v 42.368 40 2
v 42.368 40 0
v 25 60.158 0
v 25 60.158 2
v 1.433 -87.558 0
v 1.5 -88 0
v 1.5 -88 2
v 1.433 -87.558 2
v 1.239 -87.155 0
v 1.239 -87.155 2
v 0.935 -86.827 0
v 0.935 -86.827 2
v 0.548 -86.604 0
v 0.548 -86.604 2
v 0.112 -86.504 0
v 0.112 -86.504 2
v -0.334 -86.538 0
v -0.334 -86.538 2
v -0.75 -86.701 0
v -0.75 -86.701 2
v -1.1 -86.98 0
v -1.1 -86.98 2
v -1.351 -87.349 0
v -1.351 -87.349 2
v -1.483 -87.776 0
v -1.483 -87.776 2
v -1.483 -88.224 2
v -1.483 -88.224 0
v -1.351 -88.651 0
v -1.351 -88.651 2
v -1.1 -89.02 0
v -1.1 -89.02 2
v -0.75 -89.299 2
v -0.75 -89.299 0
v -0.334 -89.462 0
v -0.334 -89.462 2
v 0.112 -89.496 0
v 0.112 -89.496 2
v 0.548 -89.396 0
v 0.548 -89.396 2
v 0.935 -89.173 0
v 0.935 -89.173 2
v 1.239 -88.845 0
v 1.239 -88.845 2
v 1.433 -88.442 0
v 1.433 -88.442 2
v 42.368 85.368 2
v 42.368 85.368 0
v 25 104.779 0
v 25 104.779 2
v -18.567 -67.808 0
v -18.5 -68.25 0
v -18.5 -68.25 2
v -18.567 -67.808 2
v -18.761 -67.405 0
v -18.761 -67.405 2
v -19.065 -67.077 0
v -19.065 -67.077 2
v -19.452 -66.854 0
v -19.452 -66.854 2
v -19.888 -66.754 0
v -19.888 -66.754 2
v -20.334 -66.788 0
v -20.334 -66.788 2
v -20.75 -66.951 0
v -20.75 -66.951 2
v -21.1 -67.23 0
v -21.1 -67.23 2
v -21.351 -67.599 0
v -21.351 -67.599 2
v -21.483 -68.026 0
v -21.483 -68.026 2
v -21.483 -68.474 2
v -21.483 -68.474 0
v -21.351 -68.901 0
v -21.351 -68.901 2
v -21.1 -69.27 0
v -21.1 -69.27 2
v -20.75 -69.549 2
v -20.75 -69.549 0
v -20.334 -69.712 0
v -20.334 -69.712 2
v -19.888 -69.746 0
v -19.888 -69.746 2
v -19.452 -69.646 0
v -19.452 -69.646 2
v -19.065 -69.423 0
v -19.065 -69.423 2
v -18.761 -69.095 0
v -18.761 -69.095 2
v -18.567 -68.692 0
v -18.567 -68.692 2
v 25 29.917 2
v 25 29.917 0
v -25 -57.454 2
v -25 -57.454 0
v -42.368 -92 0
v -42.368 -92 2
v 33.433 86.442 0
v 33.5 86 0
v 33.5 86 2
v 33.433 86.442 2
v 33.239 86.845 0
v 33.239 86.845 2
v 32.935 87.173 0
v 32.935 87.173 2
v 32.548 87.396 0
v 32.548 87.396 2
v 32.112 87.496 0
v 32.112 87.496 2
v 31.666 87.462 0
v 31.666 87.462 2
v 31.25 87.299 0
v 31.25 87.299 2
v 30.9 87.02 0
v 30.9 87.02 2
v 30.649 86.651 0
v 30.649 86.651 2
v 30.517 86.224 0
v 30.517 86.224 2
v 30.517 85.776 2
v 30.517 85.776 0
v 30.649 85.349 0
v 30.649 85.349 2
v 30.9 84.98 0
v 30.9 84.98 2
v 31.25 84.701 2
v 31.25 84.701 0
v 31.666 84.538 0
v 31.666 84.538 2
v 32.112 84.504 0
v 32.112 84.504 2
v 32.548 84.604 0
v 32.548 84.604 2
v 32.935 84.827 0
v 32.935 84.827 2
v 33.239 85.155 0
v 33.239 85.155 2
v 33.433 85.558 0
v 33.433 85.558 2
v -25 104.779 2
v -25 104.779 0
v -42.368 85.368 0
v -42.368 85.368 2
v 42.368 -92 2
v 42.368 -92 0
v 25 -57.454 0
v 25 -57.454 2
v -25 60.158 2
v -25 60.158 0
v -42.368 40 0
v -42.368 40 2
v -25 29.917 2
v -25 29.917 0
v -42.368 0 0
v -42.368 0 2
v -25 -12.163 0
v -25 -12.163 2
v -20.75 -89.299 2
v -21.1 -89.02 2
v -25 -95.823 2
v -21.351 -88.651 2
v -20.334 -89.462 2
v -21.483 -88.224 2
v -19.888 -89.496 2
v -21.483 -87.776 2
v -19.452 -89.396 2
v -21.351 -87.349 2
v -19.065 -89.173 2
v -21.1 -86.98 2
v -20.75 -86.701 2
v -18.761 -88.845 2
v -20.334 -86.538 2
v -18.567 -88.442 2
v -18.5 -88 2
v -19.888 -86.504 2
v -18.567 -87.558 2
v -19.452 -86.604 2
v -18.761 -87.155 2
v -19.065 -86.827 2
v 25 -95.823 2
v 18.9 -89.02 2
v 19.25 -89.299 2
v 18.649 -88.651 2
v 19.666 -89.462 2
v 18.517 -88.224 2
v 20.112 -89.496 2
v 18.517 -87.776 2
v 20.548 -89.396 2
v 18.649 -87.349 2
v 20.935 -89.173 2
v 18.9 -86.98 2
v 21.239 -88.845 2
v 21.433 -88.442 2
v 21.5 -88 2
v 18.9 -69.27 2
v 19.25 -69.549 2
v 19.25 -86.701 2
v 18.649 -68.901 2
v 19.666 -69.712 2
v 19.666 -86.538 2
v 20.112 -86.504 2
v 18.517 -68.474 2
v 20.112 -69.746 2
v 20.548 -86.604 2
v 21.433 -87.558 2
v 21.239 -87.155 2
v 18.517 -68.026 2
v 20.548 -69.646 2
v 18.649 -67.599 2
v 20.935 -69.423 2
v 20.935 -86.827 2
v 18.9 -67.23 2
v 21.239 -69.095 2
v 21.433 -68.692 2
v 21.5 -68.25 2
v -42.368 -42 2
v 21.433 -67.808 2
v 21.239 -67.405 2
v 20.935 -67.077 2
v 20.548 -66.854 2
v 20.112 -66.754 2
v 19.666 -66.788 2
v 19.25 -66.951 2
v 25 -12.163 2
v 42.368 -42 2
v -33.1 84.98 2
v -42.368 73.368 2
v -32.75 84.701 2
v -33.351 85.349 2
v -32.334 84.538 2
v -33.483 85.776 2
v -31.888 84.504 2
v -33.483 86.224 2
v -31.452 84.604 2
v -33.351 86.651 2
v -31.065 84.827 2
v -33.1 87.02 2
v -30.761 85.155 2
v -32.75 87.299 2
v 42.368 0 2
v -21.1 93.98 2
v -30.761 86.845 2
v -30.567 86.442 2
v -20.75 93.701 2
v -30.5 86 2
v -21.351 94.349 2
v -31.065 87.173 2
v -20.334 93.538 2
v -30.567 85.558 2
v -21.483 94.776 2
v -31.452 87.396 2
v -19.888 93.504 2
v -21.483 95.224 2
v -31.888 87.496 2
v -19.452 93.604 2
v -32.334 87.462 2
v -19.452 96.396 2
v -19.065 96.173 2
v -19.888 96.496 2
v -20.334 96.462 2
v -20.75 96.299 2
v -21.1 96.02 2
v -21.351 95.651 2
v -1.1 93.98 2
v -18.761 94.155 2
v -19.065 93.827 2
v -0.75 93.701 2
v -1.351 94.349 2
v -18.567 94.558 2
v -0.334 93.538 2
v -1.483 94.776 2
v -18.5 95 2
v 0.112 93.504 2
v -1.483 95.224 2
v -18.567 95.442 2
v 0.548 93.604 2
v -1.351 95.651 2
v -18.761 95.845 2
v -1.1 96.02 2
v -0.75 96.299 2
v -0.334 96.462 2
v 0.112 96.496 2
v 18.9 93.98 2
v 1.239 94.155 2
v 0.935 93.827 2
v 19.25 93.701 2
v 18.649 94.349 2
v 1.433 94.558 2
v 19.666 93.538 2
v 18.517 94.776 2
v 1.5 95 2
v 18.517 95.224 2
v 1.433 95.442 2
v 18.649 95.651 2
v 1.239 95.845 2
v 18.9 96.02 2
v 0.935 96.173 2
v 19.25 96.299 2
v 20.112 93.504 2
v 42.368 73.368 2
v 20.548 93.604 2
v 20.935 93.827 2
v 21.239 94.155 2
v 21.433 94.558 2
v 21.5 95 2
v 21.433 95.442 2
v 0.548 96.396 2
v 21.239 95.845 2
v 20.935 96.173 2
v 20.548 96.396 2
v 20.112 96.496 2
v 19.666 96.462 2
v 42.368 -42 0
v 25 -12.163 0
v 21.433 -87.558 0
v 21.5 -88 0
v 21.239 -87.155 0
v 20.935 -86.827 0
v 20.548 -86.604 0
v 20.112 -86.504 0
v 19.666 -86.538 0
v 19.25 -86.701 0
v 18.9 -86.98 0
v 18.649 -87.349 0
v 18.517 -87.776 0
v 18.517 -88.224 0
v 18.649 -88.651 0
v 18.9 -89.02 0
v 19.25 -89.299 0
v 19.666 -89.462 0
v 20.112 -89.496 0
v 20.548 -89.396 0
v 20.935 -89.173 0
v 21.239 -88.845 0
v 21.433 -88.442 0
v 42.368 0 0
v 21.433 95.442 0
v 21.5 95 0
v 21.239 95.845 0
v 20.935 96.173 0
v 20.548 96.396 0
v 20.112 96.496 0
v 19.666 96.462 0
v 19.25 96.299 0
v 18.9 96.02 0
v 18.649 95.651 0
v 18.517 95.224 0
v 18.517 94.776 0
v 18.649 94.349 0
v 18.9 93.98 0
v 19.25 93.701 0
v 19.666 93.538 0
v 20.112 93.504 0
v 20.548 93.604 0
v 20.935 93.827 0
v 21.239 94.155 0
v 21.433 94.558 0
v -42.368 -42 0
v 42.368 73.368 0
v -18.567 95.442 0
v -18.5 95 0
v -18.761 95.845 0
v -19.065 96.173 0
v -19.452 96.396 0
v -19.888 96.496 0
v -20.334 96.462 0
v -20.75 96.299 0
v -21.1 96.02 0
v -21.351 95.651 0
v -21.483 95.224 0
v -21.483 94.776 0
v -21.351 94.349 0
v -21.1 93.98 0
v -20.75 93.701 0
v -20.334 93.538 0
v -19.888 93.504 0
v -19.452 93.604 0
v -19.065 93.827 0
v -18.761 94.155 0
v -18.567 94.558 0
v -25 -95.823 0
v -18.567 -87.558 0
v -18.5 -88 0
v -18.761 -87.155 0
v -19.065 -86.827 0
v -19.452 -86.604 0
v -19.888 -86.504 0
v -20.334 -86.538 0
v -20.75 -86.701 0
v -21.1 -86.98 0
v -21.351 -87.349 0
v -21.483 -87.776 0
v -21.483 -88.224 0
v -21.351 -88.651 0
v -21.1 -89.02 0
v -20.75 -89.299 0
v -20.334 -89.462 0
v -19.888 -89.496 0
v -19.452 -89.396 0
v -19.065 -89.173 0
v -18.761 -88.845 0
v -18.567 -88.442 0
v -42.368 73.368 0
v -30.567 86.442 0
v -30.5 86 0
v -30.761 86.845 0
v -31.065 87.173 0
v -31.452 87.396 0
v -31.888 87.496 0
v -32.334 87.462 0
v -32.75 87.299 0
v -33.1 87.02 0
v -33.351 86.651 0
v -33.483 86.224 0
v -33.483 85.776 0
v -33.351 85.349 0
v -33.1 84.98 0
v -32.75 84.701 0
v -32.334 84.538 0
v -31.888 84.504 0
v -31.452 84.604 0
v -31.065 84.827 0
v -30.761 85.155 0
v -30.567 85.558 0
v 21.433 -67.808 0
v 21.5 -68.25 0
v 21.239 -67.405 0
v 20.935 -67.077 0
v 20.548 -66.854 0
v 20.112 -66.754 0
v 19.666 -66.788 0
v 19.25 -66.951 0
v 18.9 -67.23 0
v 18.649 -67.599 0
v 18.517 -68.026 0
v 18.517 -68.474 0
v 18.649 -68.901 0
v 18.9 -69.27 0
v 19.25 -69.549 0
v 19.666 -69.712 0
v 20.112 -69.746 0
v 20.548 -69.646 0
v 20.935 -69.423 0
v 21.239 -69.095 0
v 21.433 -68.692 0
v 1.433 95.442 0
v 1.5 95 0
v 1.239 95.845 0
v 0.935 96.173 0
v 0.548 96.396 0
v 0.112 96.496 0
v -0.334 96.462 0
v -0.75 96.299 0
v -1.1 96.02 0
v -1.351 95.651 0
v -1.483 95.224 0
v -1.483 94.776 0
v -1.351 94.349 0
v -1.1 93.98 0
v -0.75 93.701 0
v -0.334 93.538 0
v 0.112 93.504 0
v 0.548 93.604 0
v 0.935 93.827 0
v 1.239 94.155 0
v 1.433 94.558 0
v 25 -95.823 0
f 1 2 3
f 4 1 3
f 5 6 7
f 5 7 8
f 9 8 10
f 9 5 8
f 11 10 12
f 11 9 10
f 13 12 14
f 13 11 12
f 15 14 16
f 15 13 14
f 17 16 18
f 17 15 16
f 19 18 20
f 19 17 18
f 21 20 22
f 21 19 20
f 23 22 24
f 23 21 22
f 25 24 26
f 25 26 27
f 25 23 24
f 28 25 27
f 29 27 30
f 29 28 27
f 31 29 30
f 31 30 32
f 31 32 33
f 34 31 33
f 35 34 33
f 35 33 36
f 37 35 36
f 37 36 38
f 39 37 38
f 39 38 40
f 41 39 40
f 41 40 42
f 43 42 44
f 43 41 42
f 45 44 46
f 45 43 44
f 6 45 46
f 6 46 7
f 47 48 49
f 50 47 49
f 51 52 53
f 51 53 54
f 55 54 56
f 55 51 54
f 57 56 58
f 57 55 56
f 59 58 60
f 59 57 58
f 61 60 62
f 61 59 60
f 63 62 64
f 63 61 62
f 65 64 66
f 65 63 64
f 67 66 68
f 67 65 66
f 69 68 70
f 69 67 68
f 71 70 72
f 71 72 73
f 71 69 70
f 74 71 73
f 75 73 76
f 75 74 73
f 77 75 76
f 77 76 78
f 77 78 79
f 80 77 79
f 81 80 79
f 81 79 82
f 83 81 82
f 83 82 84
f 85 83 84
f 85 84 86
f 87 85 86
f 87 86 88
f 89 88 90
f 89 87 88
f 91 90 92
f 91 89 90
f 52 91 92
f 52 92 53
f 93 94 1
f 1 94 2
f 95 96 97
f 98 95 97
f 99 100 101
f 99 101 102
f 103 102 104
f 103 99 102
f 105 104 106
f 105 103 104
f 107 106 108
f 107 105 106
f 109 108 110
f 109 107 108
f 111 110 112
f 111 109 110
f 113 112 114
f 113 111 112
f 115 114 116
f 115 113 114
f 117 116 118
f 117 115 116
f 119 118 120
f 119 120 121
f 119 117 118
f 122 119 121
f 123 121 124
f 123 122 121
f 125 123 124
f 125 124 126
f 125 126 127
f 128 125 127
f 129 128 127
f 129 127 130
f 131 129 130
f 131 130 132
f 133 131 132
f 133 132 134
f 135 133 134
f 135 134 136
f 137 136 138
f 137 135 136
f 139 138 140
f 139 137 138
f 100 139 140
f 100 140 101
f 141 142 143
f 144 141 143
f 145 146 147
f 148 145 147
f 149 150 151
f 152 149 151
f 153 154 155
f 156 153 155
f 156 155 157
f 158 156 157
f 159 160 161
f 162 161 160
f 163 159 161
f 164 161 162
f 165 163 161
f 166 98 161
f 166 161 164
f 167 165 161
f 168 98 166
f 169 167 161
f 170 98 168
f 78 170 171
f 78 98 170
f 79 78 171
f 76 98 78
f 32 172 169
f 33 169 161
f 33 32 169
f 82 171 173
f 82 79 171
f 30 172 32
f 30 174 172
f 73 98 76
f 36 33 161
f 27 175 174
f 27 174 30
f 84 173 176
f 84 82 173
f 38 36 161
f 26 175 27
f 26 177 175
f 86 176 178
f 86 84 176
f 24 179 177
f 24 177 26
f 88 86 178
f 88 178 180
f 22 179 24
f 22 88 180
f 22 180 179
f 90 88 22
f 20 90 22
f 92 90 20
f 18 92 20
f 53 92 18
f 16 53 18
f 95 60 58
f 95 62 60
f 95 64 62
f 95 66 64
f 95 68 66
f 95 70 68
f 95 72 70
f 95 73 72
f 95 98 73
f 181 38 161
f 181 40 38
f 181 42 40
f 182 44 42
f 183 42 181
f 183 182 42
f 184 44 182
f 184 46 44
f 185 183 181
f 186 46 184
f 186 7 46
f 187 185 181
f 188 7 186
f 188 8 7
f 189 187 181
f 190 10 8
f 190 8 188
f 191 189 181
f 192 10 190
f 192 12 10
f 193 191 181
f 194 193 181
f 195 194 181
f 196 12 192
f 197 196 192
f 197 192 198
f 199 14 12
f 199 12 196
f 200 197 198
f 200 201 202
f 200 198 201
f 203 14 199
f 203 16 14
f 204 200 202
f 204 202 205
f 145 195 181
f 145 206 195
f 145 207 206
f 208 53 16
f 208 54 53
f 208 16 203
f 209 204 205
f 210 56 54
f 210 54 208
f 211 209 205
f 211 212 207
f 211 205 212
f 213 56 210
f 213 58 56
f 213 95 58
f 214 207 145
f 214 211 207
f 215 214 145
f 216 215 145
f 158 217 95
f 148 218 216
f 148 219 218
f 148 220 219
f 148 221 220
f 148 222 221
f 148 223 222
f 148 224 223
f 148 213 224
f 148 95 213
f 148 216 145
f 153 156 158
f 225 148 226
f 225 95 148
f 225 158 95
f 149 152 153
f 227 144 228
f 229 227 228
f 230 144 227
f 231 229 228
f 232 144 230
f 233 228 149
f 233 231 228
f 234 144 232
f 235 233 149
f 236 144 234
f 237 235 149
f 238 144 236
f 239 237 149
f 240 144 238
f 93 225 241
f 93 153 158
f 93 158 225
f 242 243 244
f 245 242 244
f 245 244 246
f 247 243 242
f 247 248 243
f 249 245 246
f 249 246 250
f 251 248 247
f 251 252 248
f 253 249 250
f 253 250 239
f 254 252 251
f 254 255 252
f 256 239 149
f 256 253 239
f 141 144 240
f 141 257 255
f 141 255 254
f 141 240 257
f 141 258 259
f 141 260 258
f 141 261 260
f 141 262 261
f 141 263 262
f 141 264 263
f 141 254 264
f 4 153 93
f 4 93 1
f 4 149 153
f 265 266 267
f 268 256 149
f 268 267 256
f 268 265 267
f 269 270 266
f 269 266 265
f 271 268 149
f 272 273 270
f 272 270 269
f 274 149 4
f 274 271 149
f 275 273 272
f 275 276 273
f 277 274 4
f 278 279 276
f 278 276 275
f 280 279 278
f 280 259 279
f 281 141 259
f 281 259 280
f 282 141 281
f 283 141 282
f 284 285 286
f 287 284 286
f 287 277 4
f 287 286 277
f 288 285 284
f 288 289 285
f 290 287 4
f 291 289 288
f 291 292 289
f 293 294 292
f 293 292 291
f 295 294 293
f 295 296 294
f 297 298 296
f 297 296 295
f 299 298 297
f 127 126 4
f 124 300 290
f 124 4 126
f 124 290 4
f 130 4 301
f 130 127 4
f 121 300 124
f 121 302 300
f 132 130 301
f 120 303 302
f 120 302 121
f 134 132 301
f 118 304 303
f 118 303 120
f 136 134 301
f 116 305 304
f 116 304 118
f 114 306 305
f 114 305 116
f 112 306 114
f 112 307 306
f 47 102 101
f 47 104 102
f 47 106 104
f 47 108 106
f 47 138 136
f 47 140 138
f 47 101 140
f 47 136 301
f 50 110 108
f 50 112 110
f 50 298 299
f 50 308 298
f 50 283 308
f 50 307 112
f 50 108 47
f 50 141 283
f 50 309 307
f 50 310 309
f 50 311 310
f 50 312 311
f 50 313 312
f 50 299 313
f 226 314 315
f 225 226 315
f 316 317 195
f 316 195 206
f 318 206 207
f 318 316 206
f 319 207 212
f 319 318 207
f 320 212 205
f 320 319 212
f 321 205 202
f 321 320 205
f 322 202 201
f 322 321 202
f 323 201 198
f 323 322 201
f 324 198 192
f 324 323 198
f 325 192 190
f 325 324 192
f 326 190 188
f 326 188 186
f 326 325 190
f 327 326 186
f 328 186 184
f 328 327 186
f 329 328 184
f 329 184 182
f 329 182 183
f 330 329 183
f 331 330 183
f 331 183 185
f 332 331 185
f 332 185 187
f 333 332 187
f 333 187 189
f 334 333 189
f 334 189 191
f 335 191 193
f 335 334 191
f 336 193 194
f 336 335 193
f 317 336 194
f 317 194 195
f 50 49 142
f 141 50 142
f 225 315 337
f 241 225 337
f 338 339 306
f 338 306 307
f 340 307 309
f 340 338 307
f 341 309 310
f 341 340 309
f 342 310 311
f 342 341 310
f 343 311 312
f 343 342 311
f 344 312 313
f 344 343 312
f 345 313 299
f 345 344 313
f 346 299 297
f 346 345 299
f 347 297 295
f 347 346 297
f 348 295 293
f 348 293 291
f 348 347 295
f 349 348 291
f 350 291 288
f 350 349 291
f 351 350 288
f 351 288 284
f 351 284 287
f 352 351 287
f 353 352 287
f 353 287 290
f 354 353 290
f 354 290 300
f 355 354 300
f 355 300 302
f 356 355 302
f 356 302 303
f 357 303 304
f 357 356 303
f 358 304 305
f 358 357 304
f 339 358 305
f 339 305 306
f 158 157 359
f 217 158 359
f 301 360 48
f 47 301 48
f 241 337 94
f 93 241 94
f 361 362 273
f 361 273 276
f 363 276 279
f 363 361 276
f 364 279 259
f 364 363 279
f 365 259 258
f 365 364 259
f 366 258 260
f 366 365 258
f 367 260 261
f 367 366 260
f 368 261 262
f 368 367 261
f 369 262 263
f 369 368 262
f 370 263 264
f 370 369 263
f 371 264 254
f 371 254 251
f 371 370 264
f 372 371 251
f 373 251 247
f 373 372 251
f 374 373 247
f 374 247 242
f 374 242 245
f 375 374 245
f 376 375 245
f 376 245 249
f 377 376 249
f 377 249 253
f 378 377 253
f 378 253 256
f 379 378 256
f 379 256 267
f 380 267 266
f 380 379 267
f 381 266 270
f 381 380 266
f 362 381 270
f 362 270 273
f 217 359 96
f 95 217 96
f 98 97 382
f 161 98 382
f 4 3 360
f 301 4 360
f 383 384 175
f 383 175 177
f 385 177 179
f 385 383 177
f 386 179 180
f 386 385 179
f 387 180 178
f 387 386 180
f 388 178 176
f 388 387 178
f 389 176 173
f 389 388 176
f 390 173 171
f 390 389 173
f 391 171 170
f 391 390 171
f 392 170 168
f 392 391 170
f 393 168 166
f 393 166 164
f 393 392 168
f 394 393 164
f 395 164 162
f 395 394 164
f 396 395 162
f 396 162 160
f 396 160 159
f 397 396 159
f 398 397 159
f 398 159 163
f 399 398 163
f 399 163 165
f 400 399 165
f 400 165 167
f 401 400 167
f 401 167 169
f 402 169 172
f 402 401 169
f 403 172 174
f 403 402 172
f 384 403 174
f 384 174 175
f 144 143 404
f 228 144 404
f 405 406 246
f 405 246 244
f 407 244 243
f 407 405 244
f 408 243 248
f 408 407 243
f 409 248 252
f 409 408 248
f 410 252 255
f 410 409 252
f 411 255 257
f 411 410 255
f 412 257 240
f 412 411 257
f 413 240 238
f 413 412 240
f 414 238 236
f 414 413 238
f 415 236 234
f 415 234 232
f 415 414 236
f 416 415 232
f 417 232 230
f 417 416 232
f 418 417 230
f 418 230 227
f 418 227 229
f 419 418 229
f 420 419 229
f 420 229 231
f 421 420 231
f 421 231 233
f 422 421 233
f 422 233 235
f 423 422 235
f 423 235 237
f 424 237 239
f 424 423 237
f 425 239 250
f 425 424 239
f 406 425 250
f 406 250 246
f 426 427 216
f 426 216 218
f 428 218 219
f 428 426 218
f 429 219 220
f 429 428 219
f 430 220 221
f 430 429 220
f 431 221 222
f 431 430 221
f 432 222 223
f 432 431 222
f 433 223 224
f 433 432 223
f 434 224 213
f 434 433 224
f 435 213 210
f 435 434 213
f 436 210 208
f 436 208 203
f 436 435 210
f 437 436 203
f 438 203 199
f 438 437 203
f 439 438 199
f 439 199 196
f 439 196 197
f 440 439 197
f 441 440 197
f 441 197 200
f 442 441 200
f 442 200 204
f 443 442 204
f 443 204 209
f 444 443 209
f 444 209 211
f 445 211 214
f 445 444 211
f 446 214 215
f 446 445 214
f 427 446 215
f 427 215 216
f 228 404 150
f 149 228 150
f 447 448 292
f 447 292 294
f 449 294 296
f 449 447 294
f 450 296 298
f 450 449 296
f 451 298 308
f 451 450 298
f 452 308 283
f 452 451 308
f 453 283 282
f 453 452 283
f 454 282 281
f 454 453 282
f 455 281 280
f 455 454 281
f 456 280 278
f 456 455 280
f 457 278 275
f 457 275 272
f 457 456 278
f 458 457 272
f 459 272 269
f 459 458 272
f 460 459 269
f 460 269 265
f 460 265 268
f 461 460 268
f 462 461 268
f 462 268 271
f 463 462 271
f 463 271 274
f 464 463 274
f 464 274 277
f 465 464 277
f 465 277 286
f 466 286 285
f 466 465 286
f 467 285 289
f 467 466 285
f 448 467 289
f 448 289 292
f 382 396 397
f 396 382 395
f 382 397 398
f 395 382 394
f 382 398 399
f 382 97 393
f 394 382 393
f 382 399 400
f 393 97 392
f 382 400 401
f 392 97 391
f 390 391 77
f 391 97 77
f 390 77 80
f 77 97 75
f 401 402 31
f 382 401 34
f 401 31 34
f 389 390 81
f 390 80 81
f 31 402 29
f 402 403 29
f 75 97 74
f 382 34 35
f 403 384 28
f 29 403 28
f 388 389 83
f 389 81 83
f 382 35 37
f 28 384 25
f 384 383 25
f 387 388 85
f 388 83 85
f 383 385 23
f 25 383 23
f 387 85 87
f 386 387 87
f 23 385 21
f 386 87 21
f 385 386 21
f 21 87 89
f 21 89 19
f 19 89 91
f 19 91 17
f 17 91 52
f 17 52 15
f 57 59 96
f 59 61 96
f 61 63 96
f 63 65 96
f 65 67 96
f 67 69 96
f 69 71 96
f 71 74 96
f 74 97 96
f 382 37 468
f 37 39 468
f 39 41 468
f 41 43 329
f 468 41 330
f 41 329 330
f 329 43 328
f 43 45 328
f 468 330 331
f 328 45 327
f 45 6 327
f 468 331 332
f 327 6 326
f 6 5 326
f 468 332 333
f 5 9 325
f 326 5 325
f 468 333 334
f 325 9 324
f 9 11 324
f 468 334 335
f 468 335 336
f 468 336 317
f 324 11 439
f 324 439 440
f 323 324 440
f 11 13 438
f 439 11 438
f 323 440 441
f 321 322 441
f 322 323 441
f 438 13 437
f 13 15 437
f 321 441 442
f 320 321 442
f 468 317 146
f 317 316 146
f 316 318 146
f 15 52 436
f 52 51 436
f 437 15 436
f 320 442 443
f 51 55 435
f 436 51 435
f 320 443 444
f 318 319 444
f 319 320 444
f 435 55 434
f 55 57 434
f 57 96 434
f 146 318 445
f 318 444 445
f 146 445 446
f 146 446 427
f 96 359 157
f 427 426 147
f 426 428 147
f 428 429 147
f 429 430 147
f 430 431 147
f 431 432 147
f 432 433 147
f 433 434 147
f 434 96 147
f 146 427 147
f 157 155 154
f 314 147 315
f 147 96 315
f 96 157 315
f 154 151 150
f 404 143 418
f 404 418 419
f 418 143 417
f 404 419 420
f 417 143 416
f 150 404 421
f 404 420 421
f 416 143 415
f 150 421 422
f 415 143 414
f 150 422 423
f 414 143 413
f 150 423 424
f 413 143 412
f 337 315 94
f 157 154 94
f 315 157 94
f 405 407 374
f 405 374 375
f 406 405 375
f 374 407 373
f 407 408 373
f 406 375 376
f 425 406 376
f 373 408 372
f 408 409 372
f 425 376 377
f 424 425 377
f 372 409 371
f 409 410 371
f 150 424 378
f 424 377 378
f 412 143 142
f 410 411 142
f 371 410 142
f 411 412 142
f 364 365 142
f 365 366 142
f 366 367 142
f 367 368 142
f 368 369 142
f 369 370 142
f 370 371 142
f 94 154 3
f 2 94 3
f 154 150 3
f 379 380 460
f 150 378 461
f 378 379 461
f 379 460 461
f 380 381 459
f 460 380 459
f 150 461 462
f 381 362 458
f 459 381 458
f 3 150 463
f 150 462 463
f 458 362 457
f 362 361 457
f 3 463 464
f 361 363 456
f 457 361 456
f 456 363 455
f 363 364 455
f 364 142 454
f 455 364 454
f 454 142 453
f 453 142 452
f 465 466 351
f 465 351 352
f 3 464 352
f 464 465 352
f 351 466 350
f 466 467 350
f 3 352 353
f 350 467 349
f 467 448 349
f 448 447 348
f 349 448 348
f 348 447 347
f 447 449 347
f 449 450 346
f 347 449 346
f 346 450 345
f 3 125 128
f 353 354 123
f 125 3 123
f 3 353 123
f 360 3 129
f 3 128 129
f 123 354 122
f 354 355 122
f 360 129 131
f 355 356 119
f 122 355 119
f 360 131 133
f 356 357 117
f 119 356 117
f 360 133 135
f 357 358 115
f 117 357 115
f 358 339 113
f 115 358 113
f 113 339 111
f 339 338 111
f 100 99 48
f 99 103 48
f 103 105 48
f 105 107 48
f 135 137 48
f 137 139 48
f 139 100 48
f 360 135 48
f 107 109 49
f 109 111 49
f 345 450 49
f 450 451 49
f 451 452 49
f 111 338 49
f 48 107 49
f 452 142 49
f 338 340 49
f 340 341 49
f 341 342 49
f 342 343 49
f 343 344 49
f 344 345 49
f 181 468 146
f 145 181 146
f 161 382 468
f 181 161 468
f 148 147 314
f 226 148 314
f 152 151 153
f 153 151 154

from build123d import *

# Parameters (mm, degrees)
F0_R     = 1.5
F1_DEPTH = 2


with BuildPart() as f1:
    # F0 (on Top) → F1 (new body)
    with BuildSketch(Plane.XY):
        Polygon((-42.367958, -92), (-25, -95.822892), (25, -95.822892), (42.367958, -92), (25, -57.454384), (42.367958, -42), (25, -12.163068), (42.367958, 0), (25, 29.917361), (42.367958, 40), (25, 60.158143), (42.367958, 73.368201), (42.367958, 85.368201), (25, 104.778975), (-25, 104.778975), (-42.367958, 85.368201), (-42.367958, 73.368201), (-25, 60.158143), (-42.367958, 40), (-25, 29.917361), (-42.367958, 0), (-25, -12.163068), (-42.367958, -42), (-25, -57.454384), align=None)
        with Locations((-20, -88)):
            Circle(F0_R, mode=Mode.SUBTRACT)
        with Locations((-20, -68.25)):
            Circle(F0_R, mode=Mode.SUBTRACT)
        with Locations((0, -88)):
            Circle(F0_R, mode=Mode.SUBTRACT)
        with Locations((20, -88)):
            Circle(F0_R, mode=Mode.SUBTRACT)
        with Locations((20, -68.25)):
            Circle(F0_R, mode=Mode.SUBTRACT)
        with Locations((-32, 86)):
            Circle(F0_R, mode=Mode.SUBTRACT)
        with Locations((-20, 95)):
            Circle(F0_R, mode=Mode.SUBTRACT)
        with Locations((0, 95)):
            Circle(F0_R, mode=Mode.SUBTRACT)
        with Locations((20, 95)):
            Circle(F0_R, mode=Mode.SUBTRACT)
        with Locations((32, 86)):
            Circle(F0_R, mode=Mode.SUBTRACT)
    extrude(amount=F1_DEPTH)


solid = f1.part
